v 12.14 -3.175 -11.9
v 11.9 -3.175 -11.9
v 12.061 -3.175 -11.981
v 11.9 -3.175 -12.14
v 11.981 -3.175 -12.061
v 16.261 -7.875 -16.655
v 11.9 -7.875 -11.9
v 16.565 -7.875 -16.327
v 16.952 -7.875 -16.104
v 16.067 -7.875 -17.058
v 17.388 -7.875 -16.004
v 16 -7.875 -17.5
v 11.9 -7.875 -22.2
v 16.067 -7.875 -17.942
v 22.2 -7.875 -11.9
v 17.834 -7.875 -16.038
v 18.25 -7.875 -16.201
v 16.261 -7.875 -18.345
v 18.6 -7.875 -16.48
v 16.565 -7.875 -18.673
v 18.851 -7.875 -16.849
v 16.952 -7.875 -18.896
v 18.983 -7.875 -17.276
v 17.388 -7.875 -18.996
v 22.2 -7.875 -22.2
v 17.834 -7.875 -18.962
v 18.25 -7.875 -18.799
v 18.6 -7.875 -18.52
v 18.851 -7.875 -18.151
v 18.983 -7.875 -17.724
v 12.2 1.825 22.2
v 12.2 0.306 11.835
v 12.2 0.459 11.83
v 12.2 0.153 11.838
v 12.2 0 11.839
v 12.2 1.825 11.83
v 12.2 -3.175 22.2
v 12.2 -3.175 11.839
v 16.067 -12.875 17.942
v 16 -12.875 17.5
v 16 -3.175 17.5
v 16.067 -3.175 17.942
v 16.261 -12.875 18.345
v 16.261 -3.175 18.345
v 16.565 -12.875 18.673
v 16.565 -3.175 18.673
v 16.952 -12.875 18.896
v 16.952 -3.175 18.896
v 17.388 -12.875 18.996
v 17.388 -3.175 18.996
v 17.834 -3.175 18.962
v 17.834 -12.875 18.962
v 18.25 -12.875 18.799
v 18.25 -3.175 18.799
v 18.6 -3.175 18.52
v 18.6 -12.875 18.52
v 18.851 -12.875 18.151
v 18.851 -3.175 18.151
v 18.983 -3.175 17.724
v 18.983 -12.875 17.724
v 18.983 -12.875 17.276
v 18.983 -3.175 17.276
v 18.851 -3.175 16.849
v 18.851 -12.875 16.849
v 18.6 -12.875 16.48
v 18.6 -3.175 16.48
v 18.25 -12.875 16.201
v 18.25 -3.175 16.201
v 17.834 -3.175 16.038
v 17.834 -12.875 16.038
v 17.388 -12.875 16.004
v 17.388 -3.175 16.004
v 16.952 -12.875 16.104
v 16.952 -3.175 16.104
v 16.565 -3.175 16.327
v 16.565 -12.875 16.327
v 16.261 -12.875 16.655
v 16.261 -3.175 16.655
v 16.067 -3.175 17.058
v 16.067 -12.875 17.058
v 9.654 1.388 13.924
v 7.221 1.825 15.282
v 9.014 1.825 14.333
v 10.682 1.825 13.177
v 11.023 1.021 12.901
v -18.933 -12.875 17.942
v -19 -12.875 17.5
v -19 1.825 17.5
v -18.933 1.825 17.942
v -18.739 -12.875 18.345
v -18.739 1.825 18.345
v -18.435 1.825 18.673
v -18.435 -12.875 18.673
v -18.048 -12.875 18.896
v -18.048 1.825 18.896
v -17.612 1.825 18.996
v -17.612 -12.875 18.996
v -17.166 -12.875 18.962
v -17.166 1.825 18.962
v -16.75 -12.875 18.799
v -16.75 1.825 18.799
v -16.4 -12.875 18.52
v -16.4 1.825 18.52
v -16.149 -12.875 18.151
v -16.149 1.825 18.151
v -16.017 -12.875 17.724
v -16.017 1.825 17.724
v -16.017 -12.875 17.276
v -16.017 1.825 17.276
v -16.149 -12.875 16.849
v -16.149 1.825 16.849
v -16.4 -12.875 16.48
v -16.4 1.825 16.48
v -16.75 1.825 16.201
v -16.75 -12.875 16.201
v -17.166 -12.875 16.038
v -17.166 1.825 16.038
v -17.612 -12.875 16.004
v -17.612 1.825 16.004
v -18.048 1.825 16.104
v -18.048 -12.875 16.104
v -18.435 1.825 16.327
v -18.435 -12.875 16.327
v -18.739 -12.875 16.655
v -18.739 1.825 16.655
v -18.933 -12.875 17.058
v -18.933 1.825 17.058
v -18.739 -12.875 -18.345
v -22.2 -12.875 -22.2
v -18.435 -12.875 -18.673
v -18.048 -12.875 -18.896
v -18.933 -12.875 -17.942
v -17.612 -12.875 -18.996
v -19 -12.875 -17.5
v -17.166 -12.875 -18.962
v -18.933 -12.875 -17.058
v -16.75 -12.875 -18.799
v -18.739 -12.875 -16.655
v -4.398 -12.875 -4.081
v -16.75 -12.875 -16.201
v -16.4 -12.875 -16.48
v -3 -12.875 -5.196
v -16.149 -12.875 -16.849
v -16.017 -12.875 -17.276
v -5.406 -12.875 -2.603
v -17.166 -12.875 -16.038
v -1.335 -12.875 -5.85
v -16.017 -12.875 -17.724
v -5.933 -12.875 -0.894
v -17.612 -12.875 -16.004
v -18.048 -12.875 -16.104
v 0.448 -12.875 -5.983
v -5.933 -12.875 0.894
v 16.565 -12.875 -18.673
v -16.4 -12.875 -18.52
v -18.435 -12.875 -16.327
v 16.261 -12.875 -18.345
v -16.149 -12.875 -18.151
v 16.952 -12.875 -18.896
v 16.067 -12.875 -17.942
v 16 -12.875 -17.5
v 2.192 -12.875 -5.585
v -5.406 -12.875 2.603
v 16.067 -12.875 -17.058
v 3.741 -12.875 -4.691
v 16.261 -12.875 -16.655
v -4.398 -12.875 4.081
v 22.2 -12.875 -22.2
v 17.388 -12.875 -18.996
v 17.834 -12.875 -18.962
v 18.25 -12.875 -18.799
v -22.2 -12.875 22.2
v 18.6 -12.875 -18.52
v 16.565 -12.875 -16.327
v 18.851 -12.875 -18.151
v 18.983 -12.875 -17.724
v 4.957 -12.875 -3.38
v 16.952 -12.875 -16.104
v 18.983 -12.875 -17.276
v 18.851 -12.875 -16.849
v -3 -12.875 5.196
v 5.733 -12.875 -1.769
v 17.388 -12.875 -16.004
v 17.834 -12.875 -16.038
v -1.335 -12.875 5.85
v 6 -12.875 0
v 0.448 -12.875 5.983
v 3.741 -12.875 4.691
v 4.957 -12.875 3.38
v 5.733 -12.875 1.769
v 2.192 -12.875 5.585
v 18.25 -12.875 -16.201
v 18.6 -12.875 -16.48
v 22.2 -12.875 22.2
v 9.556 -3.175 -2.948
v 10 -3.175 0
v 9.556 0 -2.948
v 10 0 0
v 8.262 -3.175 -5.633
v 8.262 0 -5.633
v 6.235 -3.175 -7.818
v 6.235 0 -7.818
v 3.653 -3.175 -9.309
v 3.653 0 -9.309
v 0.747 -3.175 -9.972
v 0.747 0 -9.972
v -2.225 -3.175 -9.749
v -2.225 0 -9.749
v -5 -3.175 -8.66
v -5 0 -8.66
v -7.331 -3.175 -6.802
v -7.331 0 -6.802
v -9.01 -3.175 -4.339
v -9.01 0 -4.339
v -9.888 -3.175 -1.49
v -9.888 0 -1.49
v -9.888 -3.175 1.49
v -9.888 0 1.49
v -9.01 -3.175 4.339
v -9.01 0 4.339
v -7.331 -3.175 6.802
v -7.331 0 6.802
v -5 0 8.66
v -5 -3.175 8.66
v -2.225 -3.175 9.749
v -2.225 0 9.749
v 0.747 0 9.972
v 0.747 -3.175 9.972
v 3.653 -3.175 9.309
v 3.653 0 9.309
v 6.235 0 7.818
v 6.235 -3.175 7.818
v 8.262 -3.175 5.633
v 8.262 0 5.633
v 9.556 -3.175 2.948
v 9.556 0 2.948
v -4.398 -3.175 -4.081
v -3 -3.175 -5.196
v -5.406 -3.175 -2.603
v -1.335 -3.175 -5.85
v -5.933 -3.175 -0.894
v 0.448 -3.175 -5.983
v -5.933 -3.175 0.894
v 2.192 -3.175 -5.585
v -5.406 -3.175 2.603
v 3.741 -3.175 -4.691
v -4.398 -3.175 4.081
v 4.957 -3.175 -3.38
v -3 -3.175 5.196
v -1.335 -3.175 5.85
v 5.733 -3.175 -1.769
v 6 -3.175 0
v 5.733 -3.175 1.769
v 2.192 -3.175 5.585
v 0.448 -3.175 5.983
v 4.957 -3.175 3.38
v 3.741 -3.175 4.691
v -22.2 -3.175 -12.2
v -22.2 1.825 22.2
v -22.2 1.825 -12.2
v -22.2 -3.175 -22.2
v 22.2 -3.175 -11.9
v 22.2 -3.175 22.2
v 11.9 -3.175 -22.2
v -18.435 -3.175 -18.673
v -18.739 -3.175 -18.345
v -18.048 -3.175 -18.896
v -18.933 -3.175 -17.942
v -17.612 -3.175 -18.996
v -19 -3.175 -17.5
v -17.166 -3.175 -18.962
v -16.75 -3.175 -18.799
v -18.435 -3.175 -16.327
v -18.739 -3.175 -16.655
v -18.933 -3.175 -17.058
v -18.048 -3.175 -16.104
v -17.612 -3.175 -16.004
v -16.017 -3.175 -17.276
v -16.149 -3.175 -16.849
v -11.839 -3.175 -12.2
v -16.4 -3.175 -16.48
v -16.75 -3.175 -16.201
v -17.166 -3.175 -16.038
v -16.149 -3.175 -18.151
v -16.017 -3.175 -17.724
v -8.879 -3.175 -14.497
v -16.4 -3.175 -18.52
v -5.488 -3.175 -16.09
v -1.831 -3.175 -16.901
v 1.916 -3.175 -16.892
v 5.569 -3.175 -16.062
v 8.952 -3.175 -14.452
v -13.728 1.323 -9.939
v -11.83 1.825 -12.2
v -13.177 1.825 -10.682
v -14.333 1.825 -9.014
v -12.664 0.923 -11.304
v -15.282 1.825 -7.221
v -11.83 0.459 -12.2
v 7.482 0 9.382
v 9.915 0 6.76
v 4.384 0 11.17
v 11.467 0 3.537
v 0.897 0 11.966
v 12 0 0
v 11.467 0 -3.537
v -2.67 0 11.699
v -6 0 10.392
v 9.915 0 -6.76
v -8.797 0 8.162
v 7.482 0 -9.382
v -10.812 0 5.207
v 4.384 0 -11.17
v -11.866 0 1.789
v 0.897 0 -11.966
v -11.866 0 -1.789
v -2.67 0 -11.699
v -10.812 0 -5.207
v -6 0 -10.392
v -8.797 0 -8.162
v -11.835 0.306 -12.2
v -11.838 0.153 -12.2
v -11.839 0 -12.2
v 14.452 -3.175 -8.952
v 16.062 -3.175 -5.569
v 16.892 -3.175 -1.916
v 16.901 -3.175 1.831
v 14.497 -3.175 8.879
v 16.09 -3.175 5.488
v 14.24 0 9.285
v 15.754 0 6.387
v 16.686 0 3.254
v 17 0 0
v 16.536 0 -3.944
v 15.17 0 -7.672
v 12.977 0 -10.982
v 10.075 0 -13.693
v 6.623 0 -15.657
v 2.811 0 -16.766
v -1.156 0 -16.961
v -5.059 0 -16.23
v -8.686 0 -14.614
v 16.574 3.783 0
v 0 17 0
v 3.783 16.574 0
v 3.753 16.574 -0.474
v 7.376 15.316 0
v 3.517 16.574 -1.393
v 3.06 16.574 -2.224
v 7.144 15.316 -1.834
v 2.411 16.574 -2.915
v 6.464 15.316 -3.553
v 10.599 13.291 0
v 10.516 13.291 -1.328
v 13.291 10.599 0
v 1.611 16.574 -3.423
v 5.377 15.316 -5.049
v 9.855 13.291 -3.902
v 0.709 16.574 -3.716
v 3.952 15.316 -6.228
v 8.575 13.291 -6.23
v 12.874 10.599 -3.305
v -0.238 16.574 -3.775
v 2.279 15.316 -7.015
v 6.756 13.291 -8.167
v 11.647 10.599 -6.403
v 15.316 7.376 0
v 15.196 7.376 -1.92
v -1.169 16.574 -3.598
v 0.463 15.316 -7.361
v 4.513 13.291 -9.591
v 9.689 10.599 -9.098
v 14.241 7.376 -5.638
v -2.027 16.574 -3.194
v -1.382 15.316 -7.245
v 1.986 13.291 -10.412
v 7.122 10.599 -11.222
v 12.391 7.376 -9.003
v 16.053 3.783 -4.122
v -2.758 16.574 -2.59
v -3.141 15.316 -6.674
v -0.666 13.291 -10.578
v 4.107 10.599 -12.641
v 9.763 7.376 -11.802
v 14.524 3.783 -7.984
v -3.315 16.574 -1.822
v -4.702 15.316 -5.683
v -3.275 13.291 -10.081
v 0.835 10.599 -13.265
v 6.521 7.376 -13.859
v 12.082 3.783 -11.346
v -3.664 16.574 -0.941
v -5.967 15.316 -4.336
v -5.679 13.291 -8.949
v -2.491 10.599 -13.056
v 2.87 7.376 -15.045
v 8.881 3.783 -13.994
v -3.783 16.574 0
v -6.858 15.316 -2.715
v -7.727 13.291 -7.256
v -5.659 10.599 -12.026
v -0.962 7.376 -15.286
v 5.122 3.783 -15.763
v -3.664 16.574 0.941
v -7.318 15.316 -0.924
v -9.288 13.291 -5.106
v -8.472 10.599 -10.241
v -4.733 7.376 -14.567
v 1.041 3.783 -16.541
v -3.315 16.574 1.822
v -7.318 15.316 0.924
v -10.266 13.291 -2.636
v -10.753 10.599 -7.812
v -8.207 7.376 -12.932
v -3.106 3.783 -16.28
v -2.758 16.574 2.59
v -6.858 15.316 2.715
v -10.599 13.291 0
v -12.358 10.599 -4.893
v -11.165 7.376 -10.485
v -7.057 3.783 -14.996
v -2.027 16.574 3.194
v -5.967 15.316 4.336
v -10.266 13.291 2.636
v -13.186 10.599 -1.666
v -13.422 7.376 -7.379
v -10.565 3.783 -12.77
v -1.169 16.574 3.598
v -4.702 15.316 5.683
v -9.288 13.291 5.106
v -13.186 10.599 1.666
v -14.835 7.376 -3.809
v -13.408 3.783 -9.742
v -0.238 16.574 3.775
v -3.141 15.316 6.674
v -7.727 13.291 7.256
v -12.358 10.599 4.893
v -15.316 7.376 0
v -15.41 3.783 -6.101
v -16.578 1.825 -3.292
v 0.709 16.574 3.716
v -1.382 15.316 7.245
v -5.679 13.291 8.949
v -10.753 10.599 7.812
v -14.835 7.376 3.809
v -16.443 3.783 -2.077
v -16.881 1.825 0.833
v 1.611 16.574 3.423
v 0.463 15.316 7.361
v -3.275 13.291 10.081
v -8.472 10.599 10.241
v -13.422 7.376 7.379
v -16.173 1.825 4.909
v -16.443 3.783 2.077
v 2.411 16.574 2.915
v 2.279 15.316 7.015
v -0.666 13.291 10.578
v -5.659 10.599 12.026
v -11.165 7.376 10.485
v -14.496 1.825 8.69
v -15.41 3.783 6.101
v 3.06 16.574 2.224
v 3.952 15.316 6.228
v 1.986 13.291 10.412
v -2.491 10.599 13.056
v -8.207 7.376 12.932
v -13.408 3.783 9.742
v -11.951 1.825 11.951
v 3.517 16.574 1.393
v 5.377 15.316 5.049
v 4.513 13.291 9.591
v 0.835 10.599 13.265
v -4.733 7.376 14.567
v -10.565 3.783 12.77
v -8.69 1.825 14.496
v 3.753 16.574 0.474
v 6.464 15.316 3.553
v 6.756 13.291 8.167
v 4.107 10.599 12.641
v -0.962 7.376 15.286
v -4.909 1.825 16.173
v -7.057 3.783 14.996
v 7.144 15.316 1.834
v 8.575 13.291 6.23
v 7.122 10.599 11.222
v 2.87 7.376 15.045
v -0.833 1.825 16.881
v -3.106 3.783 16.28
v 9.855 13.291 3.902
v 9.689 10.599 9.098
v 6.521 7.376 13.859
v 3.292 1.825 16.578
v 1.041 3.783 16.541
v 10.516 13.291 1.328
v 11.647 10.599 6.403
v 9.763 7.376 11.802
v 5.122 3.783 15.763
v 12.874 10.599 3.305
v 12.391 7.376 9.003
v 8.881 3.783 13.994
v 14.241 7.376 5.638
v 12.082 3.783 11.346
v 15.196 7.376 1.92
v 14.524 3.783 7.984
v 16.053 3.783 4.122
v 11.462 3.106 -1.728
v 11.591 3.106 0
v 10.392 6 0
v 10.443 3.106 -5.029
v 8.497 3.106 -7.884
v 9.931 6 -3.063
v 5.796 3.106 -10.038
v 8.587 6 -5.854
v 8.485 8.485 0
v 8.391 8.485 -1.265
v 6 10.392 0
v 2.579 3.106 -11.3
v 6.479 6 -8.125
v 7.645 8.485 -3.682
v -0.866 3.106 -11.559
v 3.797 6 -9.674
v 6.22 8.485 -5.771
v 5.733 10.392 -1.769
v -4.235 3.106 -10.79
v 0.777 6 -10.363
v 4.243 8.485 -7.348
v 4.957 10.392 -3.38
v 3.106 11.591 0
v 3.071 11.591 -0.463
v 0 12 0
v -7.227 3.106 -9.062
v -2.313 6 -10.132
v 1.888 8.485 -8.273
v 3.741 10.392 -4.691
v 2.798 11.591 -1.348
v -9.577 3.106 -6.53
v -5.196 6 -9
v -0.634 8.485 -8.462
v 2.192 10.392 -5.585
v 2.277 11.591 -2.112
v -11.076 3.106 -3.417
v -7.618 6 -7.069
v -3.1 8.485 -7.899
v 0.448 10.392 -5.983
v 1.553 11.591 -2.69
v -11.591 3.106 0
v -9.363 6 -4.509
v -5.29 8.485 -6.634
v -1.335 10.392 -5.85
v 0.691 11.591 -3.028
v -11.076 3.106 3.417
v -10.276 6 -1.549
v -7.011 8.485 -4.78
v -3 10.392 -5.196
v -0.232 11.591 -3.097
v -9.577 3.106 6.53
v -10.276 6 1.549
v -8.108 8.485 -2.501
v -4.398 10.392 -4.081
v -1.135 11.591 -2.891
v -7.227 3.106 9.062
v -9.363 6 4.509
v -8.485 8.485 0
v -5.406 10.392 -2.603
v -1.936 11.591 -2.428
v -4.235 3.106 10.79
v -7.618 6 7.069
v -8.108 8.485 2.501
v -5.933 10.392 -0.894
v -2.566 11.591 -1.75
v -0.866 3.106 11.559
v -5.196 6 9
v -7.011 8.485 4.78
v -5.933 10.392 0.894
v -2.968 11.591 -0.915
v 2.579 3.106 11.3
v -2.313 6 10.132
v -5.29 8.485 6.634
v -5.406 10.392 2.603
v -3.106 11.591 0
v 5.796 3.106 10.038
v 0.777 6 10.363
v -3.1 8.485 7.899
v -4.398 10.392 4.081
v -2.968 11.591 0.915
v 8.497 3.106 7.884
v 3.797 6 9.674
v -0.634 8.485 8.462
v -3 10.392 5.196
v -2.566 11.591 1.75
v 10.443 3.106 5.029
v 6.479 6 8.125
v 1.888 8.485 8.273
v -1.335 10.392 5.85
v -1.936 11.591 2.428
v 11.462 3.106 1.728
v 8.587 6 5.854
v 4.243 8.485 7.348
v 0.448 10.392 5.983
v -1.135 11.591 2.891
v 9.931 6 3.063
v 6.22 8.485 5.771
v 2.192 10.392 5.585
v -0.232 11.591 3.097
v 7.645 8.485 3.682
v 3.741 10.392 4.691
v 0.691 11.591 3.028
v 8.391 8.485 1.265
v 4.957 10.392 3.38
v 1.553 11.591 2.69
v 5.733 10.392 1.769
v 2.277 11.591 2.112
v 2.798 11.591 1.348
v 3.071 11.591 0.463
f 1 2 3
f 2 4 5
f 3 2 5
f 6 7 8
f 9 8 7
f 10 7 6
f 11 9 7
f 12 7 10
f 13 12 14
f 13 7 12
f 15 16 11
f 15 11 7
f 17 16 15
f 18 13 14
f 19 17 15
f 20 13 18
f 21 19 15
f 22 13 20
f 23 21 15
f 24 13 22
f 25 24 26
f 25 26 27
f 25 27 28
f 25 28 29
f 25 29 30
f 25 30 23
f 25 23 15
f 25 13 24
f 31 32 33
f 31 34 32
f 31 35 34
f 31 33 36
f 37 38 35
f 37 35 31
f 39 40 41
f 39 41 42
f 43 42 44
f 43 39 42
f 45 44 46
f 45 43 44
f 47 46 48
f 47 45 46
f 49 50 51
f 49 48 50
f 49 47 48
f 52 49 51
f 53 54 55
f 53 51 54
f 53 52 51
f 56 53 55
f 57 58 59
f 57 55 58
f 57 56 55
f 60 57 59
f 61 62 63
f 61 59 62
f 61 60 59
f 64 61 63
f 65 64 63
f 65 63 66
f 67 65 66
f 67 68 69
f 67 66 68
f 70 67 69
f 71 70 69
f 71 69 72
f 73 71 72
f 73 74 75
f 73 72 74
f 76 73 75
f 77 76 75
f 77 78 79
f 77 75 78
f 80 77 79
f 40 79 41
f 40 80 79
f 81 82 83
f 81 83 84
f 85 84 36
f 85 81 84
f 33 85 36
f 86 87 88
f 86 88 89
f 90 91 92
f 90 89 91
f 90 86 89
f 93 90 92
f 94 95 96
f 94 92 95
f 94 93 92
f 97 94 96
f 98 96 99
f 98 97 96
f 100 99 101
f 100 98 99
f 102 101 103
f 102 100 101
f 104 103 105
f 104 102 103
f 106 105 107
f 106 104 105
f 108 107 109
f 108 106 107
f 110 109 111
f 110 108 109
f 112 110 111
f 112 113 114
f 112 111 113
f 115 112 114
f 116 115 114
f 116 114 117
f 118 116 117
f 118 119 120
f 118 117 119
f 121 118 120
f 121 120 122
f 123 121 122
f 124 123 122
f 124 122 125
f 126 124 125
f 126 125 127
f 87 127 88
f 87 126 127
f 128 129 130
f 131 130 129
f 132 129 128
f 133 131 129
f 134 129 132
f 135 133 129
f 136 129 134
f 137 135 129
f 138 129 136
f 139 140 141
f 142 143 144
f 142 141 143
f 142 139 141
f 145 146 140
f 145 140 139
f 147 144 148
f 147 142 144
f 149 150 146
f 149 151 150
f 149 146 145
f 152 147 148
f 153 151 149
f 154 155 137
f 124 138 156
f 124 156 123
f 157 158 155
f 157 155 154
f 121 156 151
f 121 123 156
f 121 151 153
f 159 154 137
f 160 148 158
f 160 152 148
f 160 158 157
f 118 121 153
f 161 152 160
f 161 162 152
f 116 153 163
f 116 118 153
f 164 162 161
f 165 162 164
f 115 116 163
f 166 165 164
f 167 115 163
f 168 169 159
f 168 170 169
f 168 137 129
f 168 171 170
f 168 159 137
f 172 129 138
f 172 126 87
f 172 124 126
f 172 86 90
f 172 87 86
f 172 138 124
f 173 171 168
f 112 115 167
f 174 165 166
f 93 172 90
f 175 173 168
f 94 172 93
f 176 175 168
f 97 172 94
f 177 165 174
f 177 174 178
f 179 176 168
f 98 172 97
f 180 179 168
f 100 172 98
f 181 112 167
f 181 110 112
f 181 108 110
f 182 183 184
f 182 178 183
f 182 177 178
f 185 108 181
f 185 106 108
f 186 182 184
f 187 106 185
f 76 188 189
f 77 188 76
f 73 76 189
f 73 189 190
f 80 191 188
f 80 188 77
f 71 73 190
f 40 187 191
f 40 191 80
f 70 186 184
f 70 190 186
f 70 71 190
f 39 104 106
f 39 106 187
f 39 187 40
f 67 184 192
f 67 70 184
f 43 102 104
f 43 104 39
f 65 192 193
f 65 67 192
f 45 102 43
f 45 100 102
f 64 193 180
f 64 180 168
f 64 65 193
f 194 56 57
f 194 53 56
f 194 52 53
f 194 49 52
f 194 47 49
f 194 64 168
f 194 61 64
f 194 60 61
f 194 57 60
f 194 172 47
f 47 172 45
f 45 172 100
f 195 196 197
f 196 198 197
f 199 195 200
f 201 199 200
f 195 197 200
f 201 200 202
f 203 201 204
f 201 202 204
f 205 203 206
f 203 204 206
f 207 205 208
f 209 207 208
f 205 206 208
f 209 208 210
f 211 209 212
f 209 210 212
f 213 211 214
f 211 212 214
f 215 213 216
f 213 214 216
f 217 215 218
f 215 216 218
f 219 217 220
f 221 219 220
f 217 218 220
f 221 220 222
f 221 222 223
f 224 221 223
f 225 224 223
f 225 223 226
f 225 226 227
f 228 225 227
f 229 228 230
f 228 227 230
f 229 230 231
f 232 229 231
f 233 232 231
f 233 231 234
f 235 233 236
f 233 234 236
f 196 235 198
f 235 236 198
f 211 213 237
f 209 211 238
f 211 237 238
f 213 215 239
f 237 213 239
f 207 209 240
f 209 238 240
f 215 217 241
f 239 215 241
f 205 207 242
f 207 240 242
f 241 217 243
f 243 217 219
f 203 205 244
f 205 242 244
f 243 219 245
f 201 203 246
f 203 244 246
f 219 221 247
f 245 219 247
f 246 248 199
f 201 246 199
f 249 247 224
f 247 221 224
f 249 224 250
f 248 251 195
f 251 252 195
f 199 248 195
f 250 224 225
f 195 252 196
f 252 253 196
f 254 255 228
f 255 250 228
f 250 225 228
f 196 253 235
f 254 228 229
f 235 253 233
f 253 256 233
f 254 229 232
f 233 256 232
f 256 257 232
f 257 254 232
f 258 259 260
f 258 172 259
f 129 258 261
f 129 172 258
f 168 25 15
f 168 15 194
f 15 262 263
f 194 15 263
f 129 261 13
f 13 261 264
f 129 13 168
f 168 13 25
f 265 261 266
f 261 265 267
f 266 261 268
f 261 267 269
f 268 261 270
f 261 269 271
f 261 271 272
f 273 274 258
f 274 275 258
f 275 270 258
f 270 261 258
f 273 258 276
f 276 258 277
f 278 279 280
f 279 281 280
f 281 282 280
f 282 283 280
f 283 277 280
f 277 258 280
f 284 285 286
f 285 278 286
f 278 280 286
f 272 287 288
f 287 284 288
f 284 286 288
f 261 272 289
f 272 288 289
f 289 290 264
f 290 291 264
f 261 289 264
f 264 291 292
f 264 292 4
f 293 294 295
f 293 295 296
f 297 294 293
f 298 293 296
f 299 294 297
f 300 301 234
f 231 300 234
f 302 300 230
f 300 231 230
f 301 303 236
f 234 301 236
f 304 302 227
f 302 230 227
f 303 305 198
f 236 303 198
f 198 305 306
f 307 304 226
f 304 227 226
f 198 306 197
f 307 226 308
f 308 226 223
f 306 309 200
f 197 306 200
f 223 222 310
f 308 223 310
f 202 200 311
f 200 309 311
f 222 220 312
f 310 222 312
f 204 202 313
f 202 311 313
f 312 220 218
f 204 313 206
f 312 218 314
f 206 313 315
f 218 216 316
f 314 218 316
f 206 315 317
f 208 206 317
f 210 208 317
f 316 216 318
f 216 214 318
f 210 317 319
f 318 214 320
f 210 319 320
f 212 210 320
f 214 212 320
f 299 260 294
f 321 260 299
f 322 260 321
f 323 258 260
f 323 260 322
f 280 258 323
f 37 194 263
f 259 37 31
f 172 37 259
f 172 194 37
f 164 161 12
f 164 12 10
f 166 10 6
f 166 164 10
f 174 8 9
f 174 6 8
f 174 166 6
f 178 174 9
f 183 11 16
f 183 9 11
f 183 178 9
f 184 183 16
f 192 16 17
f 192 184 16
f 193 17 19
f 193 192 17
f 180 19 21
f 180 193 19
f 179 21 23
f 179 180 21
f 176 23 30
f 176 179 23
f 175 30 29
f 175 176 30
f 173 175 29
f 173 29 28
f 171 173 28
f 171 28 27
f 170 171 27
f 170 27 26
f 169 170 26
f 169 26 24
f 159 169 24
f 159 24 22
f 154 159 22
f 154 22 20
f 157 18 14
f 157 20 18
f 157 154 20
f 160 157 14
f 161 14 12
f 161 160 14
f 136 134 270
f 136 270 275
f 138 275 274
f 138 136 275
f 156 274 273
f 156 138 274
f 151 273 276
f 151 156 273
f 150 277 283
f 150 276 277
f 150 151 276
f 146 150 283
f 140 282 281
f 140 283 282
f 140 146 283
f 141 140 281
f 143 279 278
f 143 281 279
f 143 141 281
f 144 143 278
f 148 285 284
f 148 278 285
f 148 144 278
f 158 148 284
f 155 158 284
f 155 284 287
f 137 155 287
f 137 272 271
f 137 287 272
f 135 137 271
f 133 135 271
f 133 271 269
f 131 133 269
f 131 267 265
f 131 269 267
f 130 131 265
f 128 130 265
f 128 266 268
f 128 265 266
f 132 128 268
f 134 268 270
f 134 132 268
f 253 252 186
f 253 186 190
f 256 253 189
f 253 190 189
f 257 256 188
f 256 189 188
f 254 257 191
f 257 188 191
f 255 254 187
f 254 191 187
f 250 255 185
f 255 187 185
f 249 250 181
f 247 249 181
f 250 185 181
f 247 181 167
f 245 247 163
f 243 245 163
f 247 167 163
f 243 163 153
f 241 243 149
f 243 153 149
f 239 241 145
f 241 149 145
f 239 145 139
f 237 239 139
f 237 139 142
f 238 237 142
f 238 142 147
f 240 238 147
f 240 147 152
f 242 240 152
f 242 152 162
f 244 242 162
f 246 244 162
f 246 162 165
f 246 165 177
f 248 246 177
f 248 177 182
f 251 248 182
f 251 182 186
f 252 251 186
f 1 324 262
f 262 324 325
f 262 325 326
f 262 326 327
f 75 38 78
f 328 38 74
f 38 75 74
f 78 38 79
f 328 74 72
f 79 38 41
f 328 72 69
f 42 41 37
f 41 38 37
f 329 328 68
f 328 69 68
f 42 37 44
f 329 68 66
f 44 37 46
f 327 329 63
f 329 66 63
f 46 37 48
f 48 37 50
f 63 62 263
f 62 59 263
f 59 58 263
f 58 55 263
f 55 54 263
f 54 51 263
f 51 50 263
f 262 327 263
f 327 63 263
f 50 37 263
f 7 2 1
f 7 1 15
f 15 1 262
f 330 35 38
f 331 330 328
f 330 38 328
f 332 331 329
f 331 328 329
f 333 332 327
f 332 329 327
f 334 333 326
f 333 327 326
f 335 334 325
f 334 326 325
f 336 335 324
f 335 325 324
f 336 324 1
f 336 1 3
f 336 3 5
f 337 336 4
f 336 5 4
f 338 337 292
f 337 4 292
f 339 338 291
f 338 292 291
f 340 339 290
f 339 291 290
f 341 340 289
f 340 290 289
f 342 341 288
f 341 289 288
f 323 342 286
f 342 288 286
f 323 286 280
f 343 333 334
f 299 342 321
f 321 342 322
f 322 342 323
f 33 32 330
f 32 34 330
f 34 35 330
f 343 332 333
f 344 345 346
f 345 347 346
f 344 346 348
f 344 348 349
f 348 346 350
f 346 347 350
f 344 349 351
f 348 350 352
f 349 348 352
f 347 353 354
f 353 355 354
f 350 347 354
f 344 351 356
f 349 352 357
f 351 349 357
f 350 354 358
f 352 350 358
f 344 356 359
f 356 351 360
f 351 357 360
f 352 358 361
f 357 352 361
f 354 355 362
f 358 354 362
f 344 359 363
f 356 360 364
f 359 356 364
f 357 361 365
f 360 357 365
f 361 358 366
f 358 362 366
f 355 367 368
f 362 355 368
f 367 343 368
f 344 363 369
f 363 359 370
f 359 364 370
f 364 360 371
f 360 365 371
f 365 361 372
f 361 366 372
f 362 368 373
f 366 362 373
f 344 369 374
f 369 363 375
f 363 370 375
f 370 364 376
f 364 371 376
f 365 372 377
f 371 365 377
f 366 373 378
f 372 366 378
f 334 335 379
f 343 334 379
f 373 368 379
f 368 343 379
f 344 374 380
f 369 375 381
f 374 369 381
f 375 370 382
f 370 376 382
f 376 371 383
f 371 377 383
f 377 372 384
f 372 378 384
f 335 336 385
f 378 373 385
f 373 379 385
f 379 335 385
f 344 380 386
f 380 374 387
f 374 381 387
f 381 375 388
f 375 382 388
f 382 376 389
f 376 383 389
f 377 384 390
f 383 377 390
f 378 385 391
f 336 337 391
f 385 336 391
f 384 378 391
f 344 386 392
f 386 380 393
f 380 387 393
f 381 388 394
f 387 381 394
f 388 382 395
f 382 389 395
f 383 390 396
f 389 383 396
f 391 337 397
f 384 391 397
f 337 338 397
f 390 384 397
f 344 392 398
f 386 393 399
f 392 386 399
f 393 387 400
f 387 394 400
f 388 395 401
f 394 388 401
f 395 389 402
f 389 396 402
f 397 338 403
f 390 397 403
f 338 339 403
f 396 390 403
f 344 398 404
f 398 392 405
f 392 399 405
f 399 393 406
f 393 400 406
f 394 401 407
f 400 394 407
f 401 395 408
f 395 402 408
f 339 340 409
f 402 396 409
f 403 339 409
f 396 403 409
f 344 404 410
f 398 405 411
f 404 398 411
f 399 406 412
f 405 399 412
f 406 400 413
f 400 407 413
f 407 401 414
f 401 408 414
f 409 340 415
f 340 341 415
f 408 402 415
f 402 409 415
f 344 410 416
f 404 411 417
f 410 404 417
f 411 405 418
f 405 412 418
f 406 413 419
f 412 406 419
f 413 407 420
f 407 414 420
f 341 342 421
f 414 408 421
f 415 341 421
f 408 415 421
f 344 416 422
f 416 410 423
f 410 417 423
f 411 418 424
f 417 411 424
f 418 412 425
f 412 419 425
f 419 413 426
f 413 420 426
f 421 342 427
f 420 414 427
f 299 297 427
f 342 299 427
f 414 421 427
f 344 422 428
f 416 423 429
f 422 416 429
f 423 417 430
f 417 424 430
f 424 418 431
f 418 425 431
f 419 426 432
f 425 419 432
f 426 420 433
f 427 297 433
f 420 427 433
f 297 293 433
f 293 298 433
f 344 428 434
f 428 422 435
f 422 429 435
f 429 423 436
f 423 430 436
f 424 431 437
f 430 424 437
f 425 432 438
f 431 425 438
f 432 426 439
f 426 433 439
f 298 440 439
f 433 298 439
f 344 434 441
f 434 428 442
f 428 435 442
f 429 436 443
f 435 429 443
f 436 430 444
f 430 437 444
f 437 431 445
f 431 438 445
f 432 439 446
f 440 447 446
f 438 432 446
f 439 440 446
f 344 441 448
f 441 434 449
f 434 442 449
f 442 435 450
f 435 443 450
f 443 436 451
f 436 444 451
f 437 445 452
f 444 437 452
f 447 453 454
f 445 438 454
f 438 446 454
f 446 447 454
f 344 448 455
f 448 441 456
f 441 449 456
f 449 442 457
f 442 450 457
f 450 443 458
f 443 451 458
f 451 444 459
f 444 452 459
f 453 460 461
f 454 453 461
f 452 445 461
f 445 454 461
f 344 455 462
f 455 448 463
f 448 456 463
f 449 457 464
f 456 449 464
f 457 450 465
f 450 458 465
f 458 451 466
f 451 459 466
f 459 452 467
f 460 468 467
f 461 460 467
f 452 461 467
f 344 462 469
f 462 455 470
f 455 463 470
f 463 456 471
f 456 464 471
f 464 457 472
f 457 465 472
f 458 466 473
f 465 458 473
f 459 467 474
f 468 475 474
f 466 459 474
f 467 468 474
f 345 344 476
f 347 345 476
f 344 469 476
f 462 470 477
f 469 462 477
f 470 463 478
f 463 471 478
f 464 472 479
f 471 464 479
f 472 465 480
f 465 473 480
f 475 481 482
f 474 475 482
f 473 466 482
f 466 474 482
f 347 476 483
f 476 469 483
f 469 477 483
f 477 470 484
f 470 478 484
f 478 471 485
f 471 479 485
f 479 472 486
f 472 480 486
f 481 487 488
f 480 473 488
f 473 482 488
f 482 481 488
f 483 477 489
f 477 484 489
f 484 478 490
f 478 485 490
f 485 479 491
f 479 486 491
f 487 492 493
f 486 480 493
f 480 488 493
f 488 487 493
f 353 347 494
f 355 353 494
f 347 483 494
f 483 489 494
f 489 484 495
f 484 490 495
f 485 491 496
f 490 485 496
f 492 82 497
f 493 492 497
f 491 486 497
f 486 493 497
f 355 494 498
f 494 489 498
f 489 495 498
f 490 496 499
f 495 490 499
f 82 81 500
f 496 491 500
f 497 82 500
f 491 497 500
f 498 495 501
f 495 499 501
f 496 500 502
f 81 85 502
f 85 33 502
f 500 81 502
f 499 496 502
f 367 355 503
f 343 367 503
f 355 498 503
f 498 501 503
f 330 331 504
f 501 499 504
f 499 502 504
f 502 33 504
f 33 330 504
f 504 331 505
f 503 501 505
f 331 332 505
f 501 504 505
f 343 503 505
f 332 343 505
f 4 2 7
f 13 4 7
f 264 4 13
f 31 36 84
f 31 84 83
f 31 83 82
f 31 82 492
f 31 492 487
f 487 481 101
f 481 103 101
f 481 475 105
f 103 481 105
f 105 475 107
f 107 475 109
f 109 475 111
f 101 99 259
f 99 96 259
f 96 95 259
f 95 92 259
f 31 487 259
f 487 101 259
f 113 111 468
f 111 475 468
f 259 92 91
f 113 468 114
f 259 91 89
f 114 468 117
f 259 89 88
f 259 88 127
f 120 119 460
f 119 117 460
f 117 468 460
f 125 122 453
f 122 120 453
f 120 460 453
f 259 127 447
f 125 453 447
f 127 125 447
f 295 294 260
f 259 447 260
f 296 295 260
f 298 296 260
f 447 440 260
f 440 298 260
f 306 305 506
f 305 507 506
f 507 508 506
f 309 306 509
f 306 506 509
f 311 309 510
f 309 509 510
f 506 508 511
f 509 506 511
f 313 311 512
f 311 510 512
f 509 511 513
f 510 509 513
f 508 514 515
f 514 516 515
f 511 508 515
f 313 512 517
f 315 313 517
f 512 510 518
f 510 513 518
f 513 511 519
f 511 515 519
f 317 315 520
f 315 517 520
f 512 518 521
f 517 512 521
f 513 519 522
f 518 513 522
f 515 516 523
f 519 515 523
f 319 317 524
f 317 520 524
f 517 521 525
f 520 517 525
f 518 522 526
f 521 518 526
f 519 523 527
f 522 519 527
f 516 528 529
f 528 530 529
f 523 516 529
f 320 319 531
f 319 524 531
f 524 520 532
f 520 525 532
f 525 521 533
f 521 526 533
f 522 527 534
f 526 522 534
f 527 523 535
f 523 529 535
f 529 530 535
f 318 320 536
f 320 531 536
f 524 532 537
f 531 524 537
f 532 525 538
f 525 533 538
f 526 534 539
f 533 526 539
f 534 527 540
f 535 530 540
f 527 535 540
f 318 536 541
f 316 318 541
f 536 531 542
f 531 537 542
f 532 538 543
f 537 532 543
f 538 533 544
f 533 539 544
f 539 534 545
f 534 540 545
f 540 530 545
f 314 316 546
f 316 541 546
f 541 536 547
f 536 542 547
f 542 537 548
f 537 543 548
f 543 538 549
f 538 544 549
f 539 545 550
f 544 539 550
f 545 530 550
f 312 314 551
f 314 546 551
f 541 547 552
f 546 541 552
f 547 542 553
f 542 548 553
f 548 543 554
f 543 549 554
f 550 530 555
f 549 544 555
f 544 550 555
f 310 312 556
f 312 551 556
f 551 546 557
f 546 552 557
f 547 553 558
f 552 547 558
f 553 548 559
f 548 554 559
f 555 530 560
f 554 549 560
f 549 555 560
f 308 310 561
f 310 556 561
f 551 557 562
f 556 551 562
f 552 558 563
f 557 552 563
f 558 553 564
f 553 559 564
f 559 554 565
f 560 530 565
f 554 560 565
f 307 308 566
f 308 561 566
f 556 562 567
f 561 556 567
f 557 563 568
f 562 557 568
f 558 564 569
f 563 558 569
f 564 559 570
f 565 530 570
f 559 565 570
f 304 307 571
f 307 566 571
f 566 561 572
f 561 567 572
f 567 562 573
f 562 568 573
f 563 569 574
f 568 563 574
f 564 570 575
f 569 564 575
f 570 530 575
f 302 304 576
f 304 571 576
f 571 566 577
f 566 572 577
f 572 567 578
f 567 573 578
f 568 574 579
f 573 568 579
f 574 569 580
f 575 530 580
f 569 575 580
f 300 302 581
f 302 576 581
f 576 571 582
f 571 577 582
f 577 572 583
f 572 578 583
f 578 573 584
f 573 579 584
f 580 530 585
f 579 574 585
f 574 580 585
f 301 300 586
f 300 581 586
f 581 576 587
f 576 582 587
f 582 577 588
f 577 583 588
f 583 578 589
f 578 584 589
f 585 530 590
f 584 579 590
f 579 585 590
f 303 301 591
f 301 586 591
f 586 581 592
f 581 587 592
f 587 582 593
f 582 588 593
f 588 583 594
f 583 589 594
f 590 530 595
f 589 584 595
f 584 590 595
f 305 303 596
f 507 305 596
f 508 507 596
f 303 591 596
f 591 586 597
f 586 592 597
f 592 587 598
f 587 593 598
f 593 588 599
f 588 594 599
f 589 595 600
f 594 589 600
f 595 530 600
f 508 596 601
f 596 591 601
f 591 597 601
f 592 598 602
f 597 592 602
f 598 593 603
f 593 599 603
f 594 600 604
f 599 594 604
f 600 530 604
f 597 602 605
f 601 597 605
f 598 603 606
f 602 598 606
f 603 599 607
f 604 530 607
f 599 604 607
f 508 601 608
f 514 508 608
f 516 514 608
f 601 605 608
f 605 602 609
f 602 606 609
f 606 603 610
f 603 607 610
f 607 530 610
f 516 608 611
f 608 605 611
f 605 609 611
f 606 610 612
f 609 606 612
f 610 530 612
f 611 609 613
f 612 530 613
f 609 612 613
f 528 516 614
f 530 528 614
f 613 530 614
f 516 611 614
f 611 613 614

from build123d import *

# Parameters (mm, degrees)
SKETCH3_W               = 44.4
SKETCH3_H               = 44.4
BOSS_EXTRUDE1_DEPTH     = 9.7
SKETCH5_R               = 6
CUT_EXTRUDE2_DEPTH      = 14.3
BOSS_EXTRUDE2_DEPTH     = 5
CUT_EXTRUDE3_DEPTH      = 35.870626966
CUT_EXTRUDE3_DEPTH_BACK = 35.870626966
SKETCH7_R               = 1.5
SKETCH8_W               = 10.3
SKETCH8_H               = 10.3
CUT_EXTRUDE4_DEPTH      = 4.7


with BuildPart() as part:
    # Sketch2 → Revolve1 (revolve)
    with BuildSketch(Plane.XY, mode=Mode.PRIVATE) as revolve1_sk:
        with BuildLine():
            Line((-10, 0), (-12, 0))
            ThreePointArc((-12, 0), (-8.485281374, 8.485281374), (0, 12))
            Line((0, 12), (0, 17))
            ThreePointArc((0, 17), (-12.02081528, 12.02081528), (-17, 0))
            Line((-17, 0), (-17, -3.175))
            Line((-17, -3.175), (-10, -3.175))
            Line((-10, -3.175), (-10, 0))
        make_face()
    revolve(revolve1_sk.sketch.rotate(Axis((0, 12, 0), (0, 1, 0)), 180), axis=Axis((0, 12, 0), (0, 1, 0)))

    # Sketch3 → Boss-Extrude1 (add)
    with BuildSketch(Plane.XZ.offset(3.175)):
        Rectangle(SKETCH3_W, SKETCH3_H)
    extrude(amount=BOSS_EXTRUDE1_DEPTH)

    # Sketch5 → Cut-Extrude2 (cut)
    with BuildSketch(Plane.XZ.offset(12.875)):
        Circle(SKETCH5_R)
    extrude(amount=-CUT_EXTRUDE2_DEPTH, mode=Mode.SUBTRACT)

    # Sketch6 → Boss-Extrude2 (add)
    with BuildSketch(Plane(origin=(0, -3.175, 0), x_dir=(1, 0, 0), z_dir=(0, 1, 0))):
        with BuildLine():
            Line((-22.2, -22.2), (-22.2, 12.2))
            Line((-22.2, 12.2), (-11.83, 12.2))
            ThreePointArc((-11.83, 12.2), (-11.83, -11.83), (12.2, -11.83))
            Line((12.2, -11.83), (12.2, -22.2))
            Line((12.2, -22.2), (-22.2, -22.2))
        make_face()
    extrude(amount=BOSS_EXTRUDE2_DEPTH)

    # Sketch7 → Cut-Extrude3 (cut, two sides: drawn at the far end of the back side and taken through both)
    with BuildSketch(Plane(origin=(0, 1.825, 0), x_dir=(1, 0, 0), z_dir=(0, 1, 0)).offset(-CUT_EXTRUDE3_DEPTH_BACK)):
        with Locations(Location((-17.5, -17.5, 0), (0, 0, 180))):
            Circle(SKETCH7_R)
        with Locations(Location((17.5, -17.5, 0), (0, 0, 180))):
            Circle(SKETCH7_R)
        with Locations(Location((17.5, 17.5, 0), (0, 0, 180))):
            Circle(SKETCH7_R)
        with Locations(Location((-17.5, 17.5, 0), (0, 0, 180))):
            Circle(SKETCH7_R)
    extrude(amount=CUT_EXTRUDE3_DEPTH + CUT_EXTRUDE3_DEPTH_BACK, mode=Mode.SUBTRACT)

    # Sketch8 → Cut-Extrude4 (cut)
    with BuildSketch(Plane(origin=(0, -3.175, 0), x_dir=(1, 0, 0), z_dir=(0, 1, 0))):
        with Locations((17.05, 17.05)):
            Rectangle(SKETCH8_W, SKETCH8_H)
    extrude(amount=-CUT_EXTRUDE4_DEPTH, mode=Mode.SUBTRACT)


solid = part.part
